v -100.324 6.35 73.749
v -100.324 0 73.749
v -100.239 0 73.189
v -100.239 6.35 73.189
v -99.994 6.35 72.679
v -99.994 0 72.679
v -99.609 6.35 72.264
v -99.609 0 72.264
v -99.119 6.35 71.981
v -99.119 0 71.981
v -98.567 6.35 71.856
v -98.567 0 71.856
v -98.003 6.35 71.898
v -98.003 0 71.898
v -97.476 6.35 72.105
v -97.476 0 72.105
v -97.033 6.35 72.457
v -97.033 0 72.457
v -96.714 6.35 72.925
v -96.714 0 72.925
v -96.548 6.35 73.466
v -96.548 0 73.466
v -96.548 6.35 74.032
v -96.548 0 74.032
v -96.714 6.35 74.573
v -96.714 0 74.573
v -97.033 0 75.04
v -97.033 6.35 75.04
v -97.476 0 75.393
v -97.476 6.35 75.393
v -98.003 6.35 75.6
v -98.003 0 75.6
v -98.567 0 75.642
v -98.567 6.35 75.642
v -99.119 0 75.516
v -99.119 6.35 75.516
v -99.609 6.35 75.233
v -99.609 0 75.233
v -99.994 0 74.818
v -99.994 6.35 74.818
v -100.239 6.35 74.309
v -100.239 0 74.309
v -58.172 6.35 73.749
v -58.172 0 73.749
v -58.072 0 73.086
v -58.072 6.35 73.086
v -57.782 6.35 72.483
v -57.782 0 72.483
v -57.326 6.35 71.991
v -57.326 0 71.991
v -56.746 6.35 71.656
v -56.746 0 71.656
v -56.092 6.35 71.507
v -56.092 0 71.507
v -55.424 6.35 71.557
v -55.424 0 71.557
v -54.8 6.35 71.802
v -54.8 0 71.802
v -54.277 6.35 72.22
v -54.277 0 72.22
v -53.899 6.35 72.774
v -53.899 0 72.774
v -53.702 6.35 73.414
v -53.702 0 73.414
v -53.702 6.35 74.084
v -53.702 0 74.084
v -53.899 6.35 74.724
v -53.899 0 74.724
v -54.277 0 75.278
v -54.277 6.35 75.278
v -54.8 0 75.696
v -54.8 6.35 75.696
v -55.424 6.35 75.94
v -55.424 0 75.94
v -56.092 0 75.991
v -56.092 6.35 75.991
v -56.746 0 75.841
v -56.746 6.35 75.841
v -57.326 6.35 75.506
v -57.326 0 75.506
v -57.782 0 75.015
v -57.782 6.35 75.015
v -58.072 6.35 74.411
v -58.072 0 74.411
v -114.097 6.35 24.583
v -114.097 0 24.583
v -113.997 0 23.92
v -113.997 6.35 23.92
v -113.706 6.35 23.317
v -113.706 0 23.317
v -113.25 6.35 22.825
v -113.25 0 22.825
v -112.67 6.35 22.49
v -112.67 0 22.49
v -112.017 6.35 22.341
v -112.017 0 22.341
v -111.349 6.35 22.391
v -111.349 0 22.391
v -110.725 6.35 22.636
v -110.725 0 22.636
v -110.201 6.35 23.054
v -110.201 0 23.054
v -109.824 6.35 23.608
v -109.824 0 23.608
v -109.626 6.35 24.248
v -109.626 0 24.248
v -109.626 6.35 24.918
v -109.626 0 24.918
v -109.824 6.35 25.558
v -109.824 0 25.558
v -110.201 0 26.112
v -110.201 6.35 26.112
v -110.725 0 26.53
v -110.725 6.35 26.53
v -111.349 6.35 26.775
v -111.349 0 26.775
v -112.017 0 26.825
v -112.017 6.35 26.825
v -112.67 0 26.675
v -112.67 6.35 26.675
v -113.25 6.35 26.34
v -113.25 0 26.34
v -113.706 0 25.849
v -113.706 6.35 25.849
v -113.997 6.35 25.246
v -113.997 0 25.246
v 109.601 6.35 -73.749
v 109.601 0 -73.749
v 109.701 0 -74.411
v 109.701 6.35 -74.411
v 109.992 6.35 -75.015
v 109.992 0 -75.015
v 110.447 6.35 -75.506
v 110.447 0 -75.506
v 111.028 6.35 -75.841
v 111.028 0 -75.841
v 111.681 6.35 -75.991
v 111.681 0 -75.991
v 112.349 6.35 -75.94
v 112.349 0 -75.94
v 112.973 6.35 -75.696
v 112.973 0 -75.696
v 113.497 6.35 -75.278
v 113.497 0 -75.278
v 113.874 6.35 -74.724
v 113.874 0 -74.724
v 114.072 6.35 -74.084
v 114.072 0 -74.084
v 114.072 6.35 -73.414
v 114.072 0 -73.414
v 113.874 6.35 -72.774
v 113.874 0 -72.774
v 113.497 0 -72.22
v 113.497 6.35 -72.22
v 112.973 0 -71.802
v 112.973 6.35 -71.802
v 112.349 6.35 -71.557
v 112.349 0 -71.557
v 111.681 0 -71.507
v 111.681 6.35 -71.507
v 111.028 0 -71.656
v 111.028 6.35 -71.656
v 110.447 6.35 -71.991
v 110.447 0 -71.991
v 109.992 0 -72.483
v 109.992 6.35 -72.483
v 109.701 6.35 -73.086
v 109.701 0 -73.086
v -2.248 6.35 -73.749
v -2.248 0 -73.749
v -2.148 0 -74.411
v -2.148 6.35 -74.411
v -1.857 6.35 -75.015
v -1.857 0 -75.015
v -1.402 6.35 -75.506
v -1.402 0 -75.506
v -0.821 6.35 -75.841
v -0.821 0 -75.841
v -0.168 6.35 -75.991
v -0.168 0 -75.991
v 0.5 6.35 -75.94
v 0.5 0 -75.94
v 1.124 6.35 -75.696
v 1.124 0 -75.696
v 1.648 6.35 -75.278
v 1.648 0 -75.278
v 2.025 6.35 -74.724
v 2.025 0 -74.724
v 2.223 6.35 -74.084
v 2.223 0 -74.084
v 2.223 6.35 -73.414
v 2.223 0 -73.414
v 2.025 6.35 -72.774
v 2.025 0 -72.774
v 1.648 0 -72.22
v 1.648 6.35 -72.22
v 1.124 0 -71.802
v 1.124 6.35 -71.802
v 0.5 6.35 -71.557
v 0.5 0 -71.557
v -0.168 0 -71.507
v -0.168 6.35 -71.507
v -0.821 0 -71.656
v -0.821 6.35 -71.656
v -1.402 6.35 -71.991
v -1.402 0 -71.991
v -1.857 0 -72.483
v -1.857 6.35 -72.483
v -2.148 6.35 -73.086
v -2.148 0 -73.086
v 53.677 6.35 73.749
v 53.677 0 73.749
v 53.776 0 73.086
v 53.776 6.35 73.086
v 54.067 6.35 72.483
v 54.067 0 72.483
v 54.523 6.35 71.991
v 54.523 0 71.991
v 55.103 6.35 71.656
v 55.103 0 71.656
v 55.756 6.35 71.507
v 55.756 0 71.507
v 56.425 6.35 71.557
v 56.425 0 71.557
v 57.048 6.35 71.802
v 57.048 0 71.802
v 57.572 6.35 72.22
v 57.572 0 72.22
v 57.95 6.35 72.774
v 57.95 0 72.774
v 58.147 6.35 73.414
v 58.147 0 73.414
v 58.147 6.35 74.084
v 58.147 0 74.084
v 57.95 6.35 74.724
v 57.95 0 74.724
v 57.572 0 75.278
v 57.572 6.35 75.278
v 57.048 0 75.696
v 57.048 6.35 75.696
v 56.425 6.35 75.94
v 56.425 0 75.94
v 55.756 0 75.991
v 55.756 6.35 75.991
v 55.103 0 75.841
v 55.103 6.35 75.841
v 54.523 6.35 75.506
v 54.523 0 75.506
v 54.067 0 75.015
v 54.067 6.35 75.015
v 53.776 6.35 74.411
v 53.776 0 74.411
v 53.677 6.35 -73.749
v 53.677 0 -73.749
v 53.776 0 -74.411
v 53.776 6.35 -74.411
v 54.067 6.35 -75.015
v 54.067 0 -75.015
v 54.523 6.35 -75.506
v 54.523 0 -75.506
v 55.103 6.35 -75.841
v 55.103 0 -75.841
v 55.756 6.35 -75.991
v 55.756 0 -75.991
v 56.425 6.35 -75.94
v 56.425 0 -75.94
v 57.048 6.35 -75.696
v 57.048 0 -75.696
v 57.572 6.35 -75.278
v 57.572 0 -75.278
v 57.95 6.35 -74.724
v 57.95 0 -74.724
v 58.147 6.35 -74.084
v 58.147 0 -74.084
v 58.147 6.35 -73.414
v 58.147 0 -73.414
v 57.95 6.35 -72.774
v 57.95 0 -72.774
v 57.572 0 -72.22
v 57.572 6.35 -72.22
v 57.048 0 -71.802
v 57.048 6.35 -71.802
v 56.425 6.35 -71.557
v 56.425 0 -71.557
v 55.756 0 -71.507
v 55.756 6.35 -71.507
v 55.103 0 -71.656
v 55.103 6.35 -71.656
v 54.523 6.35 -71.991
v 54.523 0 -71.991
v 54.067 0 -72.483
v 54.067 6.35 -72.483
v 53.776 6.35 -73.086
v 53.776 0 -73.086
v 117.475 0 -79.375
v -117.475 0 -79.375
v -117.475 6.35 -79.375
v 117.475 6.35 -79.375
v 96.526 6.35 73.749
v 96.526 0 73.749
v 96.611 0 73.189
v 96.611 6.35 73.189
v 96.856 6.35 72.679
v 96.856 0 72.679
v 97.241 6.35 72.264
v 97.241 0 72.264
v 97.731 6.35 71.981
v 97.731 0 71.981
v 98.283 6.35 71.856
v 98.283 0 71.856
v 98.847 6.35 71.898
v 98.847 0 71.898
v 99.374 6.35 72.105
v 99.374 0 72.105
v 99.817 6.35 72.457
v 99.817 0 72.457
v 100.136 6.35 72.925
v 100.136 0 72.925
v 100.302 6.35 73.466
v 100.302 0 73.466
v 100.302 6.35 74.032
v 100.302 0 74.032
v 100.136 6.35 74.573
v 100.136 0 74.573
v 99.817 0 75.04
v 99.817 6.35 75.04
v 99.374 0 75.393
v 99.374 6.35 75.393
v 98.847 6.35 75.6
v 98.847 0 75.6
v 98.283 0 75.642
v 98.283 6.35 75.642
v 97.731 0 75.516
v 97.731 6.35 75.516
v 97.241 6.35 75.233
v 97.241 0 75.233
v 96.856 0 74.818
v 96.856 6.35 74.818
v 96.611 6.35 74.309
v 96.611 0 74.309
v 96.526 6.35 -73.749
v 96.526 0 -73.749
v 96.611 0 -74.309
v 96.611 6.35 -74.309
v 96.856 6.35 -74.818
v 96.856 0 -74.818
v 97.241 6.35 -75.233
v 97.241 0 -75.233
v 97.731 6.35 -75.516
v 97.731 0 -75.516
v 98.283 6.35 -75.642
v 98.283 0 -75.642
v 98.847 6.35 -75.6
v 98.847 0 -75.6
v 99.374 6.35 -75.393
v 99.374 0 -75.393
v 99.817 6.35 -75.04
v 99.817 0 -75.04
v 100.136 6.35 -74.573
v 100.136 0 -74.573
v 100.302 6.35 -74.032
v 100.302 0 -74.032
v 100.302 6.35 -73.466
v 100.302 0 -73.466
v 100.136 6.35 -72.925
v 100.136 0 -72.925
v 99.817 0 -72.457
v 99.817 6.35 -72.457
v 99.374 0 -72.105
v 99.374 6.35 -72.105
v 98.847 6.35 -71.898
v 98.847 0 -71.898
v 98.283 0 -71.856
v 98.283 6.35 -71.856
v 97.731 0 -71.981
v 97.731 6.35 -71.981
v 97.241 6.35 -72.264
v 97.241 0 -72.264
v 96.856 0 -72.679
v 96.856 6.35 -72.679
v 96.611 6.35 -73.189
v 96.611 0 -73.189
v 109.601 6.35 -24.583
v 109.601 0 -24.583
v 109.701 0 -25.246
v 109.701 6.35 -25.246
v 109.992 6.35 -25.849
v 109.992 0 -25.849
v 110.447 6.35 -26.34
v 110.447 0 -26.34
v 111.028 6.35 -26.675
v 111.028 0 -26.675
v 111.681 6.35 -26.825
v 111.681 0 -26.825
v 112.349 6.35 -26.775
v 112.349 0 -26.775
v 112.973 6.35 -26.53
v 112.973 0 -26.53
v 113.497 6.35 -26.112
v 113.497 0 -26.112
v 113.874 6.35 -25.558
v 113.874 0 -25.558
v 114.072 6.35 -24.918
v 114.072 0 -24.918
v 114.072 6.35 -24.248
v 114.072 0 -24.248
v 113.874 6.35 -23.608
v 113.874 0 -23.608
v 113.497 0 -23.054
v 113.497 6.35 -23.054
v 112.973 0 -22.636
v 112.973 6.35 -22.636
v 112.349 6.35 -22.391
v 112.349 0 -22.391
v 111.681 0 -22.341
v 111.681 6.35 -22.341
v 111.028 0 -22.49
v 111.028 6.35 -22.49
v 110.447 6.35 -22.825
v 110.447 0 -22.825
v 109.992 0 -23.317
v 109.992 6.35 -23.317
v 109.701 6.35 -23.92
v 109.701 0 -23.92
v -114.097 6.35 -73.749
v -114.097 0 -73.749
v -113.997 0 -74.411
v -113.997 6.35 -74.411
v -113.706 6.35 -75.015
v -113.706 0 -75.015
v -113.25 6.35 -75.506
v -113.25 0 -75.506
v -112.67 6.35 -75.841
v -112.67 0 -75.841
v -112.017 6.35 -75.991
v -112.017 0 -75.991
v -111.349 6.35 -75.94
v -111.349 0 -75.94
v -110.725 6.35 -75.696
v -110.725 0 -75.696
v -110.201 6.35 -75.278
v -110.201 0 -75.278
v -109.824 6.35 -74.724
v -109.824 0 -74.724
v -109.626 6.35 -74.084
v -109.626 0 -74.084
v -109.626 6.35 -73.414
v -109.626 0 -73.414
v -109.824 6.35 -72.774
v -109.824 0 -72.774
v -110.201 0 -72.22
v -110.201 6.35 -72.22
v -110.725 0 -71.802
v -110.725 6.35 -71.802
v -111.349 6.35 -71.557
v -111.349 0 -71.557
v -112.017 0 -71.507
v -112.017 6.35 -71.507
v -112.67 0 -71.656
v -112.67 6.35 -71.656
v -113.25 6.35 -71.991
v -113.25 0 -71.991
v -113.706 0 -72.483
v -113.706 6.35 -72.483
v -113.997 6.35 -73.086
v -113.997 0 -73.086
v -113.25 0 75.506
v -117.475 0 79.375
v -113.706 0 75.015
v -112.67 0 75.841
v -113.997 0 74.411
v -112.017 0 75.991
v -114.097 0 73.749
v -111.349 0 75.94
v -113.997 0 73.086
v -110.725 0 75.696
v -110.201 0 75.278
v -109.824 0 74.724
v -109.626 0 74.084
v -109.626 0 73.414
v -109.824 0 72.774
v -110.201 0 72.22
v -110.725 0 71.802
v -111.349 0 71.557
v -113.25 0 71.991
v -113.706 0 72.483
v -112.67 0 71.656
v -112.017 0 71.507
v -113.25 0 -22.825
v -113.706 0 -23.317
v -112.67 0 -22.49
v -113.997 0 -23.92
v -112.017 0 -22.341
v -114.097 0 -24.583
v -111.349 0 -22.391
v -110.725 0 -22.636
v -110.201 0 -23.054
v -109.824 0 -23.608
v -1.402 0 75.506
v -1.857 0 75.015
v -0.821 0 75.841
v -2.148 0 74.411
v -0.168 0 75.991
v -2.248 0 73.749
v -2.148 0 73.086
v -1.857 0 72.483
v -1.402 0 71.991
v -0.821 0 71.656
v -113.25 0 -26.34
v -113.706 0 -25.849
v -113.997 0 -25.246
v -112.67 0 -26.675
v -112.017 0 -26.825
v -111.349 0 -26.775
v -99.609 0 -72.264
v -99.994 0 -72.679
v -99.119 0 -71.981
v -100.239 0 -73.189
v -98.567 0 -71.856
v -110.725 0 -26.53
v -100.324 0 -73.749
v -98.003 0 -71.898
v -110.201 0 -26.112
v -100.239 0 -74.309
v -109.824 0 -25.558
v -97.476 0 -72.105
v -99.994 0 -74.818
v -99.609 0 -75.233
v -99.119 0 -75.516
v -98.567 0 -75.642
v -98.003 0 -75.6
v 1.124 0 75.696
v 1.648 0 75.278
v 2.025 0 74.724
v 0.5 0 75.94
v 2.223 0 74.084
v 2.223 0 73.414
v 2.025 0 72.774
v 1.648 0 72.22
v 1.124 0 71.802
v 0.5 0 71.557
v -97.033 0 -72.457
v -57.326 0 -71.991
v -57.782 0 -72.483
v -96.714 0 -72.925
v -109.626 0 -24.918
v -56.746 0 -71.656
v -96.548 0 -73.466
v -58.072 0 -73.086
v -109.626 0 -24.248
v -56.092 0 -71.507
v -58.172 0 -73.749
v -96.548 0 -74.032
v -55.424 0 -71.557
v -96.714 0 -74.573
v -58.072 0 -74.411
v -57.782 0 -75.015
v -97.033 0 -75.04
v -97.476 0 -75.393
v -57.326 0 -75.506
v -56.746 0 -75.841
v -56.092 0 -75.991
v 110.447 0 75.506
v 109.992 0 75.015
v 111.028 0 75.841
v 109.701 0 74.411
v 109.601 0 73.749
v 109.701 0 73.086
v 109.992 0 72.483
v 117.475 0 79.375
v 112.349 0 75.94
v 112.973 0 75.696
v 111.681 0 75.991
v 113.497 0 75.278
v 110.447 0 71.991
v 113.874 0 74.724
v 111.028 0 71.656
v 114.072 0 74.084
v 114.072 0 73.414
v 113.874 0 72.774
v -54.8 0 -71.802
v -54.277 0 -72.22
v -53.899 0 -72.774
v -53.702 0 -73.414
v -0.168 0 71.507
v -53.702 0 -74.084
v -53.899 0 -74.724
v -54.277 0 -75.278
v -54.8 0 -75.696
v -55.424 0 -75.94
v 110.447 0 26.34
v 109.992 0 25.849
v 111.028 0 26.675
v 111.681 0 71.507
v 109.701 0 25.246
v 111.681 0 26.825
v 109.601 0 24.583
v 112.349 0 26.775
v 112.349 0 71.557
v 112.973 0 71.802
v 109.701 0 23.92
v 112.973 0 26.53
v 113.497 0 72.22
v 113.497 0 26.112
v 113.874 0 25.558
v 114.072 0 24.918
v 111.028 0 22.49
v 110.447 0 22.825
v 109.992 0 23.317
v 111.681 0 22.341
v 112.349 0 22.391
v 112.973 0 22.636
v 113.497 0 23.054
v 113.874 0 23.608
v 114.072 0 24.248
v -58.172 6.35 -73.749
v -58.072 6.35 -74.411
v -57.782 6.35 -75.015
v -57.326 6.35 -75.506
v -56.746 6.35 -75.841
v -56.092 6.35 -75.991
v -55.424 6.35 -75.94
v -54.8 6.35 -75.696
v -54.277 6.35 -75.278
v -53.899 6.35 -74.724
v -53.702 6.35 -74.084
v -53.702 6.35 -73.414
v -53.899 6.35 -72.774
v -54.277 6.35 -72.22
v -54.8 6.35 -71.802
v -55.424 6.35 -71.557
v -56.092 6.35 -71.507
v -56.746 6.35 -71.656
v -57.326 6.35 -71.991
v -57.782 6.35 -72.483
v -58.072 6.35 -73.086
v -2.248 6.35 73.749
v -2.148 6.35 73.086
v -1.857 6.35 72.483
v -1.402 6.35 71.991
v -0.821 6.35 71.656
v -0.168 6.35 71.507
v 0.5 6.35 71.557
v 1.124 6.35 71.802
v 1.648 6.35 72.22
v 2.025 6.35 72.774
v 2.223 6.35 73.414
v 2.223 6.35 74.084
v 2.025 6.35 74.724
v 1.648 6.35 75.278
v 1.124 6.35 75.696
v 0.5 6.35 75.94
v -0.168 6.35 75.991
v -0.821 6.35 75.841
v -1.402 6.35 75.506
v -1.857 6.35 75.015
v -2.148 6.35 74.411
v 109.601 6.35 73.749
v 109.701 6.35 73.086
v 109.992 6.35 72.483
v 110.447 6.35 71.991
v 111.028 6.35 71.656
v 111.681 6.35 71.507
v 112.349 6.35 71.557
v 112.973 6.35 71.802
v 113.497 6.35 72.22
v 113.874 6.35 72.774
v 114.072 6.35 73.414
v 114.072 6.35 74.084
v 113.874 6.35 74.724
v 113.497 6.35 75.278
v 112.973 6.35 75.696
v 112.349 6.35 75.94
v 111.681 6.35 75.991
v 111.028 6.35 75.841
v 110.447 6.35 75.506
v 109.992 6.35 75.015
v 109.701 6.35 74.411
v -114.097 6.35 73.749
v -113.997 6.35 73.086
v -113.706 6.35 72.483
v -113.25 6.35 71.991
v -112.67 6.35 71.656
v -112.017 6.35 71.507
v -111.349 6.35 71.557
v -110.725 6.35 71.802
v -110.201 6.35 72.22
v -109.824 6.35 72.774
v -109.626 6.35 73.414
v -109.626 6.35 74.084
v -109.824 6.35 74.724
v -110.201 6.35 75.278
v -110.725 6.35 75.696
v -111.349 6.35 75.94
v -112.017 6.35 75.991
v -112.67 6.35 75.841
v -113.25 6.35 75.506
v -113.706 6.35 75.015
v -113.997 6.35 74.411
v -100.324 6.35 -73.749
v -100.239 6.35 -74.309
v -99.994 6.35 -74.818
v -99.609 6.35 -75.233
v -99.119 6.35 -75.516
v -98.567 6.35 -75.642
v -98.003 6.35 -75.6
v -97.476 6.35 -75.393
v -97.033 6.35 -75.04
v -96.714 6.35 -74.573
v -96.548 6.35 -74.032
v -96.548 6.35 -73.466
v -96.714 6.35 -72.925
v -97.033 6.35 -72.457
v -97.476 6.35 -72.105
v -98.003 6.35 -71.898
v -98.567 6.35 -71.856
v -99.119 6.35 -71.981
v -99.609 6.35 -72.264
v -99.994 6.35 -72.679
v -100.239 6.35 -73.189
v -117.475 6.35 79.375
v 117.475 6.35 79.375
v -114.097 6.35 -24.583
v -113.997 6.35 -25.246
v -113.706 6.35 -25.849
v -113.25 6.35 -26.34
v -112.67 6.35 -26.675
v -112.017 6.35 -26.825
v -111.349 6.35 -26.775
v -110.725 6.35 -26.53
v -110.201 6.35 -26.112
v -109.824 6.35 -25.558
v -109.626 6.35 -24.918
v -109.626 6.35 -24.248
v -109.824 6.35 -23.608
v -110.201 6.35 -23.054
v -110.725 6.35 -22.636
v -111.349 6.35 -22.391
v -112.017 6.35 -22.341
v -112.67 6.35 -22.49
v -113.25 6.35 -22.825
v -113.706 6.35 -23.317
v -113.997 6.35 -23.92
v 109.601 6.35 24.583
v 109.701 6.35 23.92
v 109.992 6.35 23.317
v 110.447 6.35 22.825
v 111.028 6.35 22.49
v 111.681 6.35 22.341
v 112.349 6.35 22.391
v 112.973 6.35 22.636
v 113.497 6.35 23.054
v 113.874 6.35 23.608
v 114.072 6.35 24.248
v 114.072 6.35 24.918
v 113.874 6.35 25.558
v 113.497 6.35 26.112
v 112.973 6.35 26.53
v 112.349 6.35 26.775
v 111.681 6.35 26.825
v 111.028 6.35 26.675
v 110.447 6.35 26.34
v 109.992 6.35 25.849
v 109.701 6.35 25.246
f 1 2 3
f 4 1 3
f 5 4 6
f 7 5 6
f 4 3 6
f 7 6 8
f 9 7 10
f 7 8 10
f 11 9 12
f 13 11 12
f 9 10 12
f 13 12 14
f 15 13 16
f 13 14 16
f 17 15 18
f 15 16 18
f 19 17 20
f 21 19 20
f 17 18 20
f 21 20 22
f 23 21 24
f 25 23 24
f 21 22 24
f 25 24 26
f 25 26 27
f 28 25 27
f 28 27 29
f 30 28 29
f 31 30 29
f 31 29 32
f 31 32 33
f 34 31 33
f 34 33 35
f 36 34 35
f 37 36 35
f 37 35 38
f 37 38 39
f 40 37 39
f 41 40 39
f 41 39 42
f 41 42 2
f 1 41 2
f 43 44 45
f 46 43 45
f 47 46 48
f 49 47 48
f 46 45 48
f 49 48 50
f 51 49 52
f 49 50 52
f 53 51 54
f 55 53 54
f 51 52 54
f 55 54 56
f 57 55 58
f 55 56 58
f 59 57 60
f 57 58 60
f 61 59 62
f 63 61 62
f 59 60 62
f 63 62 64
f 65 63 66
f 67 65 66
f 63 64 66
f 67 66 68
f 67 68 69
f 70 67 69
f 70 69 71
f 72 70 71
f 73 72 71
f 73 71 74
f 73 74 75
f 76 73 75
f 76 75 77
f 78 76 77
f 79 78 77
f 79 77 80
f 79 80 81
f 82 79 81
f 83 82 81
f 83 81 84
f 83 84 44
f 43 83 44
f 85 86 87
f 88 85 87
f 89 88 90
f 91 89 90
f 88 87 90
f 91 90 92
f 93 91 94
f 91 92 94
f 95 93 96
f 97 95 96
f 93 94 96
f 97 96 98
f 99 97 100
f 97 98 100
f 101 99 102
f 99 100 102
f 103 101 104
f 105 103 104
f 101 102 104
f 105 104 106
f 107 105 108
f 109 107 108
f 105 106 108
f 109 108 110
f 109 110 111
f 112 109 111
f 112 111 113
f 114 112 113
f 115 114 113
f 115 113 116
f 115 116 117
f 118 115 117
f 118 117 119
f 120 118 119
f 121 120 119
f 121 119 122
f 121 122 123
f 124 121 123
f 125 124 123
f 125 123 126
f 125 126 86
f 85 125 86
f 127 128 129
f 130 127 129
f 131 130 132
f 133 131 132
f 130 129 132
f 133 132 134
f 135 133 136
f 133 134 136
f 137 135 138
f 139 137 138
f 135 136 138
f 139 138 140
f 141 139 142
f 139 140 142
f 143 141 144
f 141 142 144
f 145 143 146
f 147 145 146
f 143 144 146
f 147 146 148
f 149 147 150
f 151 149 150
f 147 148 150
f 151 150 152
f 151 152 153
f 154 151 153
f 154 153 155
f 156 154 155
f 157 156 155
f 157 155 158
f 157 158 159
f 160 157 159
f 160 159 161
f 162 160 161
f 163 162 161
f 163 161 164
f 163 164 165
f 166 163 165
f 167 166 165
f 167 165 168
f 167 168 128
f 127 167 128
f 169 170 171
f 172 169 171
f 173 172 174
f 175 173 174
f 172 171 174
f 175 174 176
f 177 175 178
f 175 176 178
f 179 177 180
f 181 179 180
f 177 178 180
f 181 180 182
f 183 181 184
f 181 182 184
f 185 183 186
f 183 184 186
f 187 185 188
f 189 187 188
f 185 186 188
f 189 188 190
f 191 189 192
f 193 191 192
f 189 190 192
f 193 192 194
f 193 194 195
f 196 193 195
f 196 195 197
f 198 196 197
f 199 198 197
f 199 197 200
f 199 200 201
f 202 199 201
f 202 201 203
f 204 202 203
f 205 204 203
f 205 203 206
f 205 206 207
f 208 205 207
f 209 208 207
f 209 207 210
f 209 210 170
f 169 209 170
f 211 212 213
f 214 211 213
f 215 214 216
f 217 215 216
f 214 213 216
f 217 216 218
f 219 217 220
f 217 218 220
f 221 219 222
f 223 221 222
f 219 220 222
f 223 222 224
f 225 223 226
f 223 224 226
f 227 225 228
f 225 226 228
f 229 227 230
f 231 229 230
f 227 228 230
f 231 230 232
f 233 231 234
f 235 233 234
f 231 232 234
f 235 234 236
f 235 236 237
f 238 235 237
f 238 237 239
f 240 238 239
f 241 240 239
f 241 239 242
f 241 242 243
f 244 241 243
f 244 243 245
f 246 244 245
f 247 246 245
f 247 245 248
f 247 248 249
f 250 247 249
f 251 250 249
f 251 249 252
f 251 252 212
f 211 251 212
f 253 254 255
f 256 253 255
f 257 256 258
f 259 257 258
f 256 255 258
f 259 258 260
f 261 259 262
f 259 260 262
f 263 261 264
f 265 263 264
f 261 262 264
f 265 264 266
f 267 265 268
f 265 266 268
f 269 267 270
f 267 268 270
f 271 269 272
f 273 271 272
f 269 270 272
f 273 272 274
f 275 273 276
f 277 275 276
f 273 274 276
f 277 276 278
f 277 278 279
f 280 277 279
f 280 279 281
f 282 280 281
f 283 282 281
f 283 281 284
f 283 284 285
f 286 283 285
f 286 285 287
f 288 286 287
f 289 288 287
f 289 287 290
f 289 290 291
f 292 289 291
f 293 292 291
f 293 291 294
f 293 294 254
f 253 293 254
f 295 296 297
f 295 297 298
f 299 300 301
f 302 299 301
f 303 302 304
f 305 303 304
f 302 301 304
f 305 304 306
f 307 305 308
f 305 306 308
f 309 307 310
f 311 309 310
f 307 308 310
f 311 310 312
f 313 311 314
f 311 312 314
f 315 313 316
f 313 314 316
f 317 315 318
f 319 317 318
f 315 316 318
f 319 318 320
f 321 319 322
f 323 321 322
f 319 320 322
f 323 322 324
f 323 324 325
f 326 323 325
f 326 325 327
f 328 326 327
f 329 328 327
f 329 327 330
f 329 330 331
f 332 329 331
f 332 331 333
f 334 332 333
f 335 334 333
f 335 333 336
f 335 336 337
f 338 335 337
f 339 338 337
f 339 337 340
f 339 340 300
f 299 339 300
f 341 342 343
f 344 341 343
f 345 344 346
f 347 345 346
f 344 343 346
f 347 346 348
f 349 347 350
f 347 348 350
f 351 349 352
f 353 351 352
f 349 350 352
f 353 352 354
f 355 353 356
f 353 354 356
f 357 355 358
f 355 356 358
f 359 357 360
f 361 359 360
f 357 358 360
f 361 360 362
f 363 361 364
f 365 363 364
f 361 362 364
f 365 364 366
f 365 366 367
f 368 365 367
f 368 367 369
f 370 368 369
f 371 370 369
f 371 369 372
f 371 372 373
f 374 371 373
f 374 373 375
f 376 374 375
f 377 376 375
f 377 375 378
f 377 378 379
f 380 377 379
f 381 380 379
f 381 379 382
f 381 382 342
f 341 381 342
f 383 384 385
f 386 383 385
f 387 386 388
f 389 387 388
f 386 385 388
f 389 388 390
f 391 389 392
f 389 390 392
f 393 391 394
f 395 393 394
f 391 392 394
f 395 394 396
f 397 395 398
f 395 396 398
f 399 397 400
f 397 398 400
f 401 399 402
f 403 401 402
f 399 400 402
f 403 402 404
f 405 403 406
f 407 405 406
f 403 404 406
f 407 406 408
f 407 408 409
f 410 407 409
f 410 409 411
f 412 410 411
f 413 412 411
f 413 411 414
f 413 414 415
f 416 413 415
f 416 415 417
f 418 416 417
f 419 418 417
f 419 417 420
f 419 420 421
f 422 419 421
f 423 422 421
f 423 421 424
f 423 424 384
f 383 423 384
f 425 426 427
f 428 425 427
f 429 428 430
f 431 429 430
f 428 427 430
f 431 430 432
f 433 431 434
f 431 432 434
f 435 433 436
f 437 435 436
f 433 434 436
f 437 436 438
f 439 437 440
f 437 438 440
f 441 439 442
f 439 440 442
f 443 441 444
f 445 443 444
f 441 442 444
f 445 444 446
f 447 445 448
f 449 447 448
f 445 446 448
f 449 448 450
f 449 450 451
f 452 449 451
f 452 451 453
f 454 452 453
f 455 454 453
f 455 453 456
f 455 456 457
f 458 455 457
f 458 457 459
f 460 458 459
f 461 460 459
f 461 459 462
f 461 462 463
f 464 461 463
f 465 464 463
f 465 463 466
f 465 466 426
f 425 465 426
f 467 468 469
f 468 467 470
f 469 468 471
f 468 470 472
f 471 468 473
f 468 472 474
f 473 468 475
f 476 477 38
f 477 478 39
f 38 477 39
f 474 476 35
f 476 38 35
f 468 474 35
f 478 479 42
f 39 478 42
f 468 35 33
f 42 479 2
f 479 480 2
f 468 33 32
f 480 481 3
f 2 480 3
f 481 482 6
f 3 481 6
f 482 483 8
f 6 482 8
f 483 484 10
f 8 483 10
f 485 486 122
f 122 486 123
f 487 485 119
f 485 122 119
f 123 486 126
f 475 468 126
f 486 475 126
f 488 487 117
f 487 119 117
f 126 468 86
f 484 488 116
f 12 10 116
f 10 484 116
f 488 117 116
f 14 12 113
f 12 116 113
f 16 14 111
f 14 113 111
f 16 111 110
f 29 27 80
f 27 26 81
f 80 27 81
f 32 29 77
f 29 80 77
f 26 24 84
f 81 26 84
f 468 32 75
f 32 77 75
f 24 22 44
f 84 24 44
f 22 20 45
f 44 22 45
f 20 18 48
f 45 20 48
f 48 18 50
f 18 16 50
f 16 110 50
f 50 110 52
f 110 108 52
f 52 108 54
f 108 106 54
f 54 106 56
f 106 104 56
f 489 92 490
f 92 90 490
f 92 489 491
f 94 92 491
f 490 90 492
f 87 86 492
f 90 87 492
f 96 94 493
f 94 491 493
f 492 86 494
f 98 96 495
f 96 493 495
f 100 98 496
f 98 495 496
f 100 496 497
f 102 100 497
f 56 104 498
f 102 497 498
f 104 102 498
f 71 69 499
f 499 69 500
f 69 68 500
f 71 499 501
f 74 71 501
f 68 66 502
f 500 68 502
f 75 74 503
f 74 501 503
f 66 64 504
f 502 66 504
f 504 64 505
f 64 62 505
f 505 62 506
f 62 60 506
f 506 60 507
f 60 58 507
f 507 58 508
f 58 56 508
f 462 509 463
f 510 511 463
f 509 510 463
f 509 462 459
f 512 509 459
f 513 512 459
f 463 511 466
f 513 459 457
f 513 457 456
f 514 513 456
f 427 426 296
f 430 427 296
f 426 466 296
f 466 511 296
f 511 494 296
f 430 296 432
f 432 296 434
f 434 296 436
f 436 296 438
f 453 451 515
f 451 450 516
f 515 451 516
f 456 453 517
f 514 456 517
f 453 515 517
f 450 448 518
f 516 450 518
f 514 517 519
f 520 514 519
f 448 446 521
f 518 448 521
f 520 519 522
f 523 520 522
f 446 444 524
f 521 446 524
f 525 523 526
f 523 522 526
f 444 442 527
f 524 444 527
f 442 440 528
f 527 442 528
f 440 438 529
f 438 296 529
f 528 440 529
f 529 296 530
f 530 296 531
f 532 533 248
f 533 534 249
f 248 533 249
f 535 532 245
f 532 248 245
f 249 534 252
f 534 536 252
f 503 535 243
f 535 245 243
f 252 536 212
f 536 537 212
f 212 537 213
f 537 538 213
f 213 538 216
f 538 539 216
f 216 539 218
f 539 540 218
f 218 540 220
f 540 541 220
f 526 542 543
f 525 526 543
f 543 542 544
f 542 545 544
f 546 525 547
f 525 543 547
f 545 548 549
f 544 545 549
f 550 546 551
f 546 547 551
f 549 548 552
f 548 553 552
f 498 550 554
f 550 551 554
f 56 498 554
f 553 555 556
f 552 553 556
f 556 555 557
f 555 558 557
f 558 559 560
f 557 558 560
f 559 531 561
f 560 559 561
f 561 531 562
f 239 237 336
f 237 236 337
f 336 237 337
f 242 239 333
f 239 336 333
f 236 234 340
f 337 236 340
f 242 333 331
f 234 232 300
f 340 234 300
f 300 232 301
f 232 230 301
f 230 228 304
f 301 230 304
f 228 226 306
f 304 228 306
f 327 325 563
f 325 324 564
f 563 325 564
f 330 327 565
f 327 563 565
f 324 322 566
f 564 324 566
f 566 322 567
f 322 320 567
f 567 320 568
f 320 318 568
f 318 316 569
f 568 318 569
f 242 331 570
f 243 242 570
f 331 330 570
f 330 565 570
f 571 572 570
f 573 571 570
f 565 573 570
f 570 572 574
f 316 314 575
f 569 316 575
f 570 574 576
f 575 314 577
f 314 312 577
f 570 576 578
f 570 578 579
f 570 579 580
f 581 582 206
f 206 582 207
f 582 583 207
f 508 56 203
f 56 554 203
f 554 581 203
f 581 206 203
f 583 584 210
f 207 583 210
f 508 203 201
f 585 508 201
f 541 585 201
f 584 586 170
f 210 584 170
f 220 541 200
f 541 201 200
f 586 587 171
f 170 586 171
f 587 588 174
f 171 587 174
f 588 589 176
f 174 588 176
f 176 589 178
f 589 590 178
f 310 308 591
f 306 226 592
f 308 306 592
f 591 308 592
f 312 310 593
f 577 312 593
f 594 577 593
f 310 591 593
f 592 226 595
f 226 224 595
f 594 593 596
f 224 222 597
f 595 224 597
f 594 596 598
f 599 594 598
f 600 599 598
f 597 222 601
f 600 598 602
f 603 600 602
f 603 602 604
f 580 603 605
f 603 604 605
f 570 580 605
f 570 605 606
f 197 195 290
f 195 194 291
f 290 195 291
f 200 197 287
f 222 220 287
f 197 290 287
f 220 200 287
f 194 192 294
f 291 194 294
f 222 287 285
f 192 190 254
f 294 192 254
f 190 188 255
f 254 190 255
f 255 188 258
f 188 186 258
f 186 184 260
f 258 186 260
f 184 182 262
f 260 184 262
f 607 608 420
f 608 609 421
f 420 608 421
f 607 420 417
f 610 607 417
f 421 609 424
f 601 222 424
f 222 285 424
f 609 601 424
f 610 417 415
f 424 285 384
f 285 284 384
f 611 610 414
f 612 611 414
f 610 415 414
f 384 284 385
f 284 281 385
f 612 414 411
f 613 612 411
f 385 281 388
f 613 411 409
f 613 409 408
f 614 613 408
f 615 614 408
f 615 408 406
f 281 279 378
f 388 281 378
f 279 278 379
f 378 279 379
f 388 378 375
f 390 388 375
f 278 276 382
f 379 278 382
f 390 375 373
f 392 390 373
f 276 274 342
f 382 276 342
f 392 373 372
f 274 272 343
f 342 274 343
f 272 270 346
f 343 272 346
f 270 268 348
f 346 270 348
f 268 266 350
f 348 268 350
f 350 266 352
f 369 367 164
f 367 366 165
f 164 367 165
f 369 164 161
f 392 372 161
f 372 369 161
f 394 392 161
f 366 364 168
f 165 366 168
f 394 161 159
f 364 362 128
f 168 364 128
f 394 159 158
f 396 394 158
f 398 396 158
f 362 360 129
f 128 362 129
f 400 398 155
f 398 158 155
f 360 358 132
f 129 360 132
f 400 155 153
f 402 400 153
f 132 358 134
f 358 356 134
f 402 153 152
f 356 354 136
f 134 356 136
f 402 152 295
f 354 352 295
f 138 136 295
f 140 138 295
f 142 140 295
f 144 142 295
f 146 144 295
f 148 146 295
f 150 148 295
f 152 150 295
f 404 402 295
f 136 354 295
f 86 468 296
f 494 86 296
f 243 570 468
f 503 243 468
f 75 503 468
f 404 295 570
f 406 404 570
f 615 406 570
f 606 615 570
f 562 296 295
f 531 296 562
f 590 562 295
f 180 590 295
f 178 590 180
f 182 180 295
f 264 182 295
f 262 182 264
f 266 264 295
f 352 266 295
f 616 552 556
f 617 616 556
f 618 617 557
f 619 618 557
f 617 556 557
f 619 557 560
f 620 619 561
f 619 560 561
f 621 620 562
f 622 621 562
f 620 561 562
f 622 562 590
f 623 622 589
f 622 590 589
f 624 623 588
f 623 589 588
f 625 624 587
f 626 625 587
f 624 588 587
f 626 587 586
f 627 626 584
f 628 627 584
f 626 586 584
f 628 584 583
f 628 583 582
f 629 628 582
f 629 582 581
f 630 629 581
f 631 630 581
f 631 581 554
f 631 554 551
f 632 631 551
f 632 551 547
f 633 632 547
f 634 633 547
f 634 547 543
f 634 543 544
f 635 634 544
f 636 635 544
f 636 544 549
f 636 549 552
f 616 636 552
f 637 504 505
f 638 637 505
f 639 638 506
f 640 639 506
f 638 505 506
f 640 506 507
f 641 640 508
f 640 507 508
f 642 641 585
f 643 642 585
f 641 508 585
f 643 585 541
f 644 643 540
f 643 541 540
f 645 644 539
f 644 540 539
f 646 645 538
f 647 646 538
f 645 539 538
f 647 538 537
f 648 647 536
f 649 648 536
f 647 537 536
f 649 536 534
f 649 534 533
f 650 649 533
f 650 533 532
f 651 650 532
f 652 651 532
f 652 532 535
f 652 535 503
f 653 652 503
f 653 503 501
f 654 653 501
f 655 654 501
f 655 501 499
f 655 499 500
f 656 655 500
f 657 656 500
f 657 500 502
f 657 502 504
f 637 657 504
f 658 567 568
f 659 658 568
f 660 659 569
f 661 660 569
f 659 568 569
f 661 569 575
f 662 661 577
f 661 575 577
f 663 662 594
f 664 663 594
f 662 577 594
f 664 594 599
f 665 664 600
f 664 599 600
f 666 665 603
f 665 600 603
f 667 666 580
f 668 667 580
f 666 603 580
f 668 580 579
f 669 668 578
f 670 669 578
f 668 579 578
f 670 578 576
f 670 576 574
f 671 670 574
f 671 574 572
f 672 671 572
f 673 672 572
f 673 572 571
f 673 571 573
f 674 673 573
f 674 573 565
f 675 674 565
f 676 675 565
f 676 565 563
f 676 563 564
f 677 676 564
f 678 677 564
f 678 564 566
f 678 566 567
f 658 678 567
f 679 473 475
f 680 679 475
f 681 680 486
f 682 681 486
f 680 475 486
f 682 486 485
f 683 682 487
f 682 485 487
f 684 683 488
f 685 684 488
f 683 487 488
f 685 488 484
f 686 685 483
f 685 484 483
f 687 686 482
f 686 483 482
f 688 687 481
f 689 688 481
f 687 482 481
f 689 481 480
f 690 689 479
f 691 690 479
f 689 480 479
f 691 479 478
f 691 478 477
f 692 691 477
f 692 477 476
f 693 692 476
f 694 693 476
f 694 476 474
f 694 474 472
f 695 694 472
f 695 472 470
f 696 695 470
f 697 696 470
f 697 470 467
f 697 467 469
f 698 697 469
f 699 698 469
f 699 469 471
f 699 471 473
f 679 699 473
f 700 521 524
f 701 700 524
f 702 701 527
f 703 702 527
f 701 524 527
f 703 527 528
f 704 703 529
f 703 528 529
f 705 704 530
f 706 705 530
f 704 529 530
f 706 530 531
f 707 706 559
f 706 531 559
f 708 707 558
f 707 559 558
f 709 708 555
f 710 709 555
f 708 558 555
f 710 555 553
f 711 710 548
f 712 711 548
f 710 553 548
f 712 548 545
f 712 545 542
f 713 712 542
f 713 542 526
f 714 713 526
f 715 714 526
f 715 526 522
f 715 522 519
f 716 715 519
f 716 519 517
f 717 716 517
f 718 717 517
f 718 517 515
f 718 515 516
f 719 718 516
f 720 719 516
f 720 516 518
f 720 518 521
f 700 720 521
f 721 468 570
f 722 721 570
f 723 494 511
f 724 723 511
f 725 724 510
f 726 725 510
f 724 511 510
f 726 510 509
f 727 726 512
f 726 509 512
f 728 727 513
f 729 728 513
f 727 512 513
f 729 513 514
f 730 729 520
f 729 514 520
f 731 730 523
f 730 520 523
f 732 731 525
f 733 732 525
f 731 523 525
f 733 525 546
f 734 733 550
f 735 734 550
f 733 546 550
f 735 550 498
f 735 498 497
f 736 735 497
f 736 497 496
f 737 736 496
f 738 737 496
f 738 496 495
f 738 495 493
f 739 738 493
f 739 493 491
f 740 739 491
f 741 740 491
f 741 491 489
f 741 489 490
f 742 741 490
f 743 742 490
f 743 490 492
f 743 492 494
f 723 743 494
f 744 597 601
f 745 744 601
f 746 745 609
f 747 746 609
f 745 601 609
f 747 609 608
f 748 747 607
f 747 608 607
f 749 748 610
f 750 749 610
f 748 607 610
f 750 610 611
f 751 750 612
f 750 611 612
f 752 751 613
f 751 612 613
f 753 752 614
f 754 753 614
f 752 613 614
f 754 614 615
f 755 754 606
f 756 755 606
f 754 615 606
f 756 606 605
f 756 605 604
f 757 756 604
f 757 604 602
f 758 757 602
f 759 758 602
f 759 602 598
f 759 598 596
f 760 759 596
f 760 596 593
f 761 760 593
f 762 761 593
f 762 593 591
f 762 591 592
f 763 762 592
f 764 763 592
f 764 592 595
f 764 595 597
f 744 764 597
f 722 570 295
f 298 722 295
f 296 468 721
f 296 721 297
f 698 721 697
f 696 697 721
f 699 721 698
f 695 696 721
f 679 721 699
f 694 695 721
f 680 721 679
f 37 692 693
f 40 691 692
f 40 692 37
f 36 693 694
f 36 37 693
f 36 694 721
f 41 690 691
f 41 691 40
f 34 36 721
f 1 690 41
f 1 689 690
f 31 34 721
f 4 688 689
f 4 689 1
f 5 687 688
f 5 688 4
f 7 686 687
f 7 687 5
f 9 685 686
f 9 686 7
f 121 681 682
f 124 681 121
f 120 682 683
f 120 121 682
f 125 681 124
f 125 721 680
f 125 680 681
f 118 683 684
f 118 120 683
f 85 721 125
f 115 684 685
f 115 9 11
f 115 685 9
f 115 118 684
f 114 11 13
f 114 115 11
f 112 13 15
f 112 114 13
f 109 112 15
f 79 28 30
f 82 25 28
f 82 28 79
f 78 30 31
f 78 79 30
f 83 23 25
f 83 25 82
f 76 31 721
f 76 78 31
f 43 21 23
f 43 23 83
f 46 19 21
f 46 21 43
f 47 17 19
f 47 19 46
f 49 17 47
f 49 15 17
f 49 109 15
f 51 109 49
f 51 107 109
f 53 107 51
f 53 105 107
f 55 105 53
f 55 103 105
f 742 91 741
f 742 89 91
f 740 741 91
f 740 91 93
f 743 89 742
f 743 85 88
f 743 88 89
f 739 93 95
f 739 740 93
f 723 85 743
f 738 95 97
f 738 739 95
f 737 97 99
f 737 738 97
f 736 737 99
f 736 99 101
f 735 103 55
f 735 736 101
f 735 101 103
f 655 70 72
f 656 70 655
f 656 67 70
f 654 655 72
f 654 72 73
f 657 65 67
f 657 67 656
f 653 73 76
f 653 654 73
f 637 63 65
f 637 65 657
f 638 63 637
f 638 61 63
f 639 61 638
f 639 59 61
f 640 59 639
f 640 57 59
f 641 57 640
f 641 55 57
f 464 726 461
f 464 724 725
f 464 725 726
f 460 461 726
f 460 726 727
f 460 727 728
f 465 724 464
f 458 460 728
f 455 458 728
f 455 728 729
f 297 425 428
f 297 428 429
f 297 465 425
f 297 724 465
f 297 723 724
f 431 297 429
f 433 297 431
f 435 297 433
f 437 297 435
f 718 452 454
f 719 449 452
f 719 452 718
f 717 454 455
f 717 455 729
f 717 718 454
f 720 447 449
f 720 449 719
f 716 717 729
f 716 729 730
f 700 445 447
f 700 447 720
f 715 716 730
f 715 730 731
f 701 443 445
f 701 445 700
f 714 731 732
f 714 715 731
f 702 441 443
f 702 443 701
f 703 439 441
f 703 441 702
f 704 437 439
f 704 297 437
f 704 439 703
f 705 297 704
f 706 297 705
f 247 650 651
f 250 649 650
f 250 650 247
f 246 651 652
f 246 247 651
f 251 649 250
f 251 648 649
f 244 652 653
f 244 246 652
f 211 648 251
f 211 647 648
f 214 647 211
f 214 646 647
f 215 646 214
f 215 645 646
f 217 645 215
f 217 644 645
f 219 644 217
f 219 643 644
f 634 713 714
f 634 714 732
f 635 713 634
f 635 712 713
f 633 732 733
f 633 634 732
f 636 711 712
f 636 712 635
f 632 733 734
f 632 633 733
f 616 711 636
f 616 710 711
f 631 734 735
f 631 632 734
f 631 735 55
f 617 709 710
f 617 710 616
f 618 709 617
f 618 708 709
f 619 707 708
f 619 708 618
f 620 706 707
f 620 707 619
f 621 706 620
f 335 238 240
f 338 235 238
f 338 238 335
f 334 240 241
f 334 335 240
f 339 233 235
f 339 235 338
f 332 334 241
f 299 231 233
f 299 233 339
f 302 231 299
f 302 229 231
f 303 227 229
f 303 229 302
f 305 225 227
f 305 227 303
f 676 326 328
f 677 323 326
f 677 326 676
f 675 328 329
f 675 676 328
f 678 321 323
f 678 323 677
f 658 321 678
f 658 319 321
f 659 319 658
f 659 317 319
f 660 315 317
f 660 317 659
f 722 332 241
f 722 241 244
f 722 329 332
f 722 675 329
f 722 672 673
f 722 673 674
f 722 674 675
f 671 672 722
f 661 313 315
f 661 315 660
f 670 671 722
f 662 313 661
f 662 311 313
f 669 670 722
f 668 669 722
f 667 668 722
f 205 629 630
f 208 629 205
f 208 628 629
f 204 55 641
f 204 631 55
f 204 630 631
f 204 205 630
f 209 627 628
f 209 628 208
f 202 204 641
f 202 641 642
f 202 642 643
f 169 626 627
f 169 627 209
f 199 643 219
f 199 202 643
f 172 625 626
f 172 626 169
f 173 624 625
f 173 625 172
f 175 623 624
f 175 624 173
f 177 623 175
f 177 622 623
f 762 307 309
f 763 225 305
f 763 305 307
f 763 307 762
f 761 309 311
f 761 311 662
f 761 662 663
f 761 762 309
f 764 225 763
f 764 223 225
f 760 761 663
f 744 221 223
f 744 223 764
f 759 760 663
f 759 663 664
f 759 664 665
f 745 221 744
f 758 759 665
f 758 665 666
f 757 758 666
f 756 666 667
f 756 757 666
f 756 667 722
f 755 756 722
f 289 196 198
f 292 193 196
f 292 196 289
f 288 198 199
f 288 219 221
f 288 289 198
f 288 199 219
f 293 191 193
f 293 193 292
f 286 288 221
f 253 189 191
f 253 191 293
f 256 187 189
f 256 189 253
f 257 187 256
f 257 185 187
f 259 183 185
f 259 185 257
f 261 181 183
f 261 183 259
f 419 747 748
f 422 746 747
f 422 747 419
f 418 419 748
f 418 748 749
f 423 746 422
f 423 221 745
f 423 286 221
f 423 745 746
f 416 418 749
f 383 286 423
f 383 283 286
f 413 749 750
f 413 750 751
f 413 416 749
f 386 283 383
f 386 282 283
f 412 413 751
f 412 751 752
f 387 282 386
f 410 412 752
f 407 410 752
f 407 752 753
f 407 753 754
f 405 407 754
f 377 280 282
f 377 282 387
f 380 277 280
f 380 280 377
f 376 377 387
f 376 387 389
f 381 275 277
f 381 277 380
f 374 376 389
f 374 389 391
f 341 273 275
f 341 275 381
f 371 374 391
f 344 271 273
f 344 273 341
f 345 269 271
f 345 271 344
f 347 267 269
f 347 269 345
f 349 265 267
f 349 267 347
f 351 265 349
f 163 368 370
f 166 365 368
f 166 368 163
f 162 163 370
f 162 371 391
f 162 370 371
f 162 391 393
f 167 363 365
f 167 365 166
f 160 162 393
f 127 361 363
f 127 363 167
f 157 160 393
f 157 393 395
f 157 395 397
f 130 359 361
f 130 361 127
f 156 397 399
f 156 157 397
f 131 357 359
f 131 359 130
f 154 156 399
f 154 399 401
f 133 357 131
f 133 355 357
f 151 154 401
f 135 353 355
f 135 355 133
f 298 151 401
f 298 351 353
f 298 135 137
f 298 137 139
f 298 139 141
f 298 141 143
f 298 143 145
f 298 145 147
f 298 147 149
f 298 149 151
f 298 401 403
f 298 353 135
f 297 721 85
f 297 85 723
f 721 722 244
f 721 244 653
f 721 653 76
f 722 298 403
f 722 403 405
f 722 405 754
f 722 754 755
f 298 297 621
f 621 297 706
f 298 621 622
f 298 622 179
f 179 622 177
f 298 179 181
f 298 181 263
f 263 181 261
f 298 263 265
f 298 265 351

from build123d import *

# Parameters (mm, degrees)
SKETCH1_W             = 234.95
SKETCH1_H             = 158.75
BOSS_EXTRUDE1_DEPTH   = 6.35
F_8_CLEARANCE_HOLE1_D = 4.4958
F_6_CLEARANCE_HOLE1_D = 3.7973


with BuildPart() as part:
    # Sketch1 → Boss-Extrude1 (new body)
    with BuildSketch(Plane(origin=(0, 0, 0), x_dir=(1, 0, 0), z_dir=(0, 1, 0))):
        Rectangle(SKETCH1_W, SKETCH1_H)
    extrude(amount=BOSS_EXTRUDE1_DEPTH)

    # #8 Clearance Hole1 (through all)
    with Locations(Plane(origin=(0, 6.35, 0), x_dir=(1, 0, 0), z_dir=(0, 1, 0))):
        with Locations((0, 73.7489), (-55.92445, 73.7489), (-111.8489, 73.7489), (-111.8489, 24.582966667), (-111.8489, -24.582966667), (-111.8489, -73.7489), (111.8489, -73.7489), (111.8489, -24.582966667), (111.8489, 24.582966667), (55.92445, 73.7489), (111.8489, 73.7489), (55.92445, -73.7489), (0, -73.7489), (-55.92445, -73.7489)):
            Hole(F_8_CLEARANCE_HOLE1_D / 2)

    # #6 Clearance Hole1 (through all)
    with Locations(Plane(origin=(0, 6.35, 0), x_dir=(1, 0, 0), z_dir=(0, 1, 0))):
        with Locations((-98.425, 73.7489), (-98.425, -73.7489), (98.425, 73.7489), (98.425, -73.7489)):
            Hole(F_6_CLEARANCE_HOLE1_D / 2)


solid = part.part
